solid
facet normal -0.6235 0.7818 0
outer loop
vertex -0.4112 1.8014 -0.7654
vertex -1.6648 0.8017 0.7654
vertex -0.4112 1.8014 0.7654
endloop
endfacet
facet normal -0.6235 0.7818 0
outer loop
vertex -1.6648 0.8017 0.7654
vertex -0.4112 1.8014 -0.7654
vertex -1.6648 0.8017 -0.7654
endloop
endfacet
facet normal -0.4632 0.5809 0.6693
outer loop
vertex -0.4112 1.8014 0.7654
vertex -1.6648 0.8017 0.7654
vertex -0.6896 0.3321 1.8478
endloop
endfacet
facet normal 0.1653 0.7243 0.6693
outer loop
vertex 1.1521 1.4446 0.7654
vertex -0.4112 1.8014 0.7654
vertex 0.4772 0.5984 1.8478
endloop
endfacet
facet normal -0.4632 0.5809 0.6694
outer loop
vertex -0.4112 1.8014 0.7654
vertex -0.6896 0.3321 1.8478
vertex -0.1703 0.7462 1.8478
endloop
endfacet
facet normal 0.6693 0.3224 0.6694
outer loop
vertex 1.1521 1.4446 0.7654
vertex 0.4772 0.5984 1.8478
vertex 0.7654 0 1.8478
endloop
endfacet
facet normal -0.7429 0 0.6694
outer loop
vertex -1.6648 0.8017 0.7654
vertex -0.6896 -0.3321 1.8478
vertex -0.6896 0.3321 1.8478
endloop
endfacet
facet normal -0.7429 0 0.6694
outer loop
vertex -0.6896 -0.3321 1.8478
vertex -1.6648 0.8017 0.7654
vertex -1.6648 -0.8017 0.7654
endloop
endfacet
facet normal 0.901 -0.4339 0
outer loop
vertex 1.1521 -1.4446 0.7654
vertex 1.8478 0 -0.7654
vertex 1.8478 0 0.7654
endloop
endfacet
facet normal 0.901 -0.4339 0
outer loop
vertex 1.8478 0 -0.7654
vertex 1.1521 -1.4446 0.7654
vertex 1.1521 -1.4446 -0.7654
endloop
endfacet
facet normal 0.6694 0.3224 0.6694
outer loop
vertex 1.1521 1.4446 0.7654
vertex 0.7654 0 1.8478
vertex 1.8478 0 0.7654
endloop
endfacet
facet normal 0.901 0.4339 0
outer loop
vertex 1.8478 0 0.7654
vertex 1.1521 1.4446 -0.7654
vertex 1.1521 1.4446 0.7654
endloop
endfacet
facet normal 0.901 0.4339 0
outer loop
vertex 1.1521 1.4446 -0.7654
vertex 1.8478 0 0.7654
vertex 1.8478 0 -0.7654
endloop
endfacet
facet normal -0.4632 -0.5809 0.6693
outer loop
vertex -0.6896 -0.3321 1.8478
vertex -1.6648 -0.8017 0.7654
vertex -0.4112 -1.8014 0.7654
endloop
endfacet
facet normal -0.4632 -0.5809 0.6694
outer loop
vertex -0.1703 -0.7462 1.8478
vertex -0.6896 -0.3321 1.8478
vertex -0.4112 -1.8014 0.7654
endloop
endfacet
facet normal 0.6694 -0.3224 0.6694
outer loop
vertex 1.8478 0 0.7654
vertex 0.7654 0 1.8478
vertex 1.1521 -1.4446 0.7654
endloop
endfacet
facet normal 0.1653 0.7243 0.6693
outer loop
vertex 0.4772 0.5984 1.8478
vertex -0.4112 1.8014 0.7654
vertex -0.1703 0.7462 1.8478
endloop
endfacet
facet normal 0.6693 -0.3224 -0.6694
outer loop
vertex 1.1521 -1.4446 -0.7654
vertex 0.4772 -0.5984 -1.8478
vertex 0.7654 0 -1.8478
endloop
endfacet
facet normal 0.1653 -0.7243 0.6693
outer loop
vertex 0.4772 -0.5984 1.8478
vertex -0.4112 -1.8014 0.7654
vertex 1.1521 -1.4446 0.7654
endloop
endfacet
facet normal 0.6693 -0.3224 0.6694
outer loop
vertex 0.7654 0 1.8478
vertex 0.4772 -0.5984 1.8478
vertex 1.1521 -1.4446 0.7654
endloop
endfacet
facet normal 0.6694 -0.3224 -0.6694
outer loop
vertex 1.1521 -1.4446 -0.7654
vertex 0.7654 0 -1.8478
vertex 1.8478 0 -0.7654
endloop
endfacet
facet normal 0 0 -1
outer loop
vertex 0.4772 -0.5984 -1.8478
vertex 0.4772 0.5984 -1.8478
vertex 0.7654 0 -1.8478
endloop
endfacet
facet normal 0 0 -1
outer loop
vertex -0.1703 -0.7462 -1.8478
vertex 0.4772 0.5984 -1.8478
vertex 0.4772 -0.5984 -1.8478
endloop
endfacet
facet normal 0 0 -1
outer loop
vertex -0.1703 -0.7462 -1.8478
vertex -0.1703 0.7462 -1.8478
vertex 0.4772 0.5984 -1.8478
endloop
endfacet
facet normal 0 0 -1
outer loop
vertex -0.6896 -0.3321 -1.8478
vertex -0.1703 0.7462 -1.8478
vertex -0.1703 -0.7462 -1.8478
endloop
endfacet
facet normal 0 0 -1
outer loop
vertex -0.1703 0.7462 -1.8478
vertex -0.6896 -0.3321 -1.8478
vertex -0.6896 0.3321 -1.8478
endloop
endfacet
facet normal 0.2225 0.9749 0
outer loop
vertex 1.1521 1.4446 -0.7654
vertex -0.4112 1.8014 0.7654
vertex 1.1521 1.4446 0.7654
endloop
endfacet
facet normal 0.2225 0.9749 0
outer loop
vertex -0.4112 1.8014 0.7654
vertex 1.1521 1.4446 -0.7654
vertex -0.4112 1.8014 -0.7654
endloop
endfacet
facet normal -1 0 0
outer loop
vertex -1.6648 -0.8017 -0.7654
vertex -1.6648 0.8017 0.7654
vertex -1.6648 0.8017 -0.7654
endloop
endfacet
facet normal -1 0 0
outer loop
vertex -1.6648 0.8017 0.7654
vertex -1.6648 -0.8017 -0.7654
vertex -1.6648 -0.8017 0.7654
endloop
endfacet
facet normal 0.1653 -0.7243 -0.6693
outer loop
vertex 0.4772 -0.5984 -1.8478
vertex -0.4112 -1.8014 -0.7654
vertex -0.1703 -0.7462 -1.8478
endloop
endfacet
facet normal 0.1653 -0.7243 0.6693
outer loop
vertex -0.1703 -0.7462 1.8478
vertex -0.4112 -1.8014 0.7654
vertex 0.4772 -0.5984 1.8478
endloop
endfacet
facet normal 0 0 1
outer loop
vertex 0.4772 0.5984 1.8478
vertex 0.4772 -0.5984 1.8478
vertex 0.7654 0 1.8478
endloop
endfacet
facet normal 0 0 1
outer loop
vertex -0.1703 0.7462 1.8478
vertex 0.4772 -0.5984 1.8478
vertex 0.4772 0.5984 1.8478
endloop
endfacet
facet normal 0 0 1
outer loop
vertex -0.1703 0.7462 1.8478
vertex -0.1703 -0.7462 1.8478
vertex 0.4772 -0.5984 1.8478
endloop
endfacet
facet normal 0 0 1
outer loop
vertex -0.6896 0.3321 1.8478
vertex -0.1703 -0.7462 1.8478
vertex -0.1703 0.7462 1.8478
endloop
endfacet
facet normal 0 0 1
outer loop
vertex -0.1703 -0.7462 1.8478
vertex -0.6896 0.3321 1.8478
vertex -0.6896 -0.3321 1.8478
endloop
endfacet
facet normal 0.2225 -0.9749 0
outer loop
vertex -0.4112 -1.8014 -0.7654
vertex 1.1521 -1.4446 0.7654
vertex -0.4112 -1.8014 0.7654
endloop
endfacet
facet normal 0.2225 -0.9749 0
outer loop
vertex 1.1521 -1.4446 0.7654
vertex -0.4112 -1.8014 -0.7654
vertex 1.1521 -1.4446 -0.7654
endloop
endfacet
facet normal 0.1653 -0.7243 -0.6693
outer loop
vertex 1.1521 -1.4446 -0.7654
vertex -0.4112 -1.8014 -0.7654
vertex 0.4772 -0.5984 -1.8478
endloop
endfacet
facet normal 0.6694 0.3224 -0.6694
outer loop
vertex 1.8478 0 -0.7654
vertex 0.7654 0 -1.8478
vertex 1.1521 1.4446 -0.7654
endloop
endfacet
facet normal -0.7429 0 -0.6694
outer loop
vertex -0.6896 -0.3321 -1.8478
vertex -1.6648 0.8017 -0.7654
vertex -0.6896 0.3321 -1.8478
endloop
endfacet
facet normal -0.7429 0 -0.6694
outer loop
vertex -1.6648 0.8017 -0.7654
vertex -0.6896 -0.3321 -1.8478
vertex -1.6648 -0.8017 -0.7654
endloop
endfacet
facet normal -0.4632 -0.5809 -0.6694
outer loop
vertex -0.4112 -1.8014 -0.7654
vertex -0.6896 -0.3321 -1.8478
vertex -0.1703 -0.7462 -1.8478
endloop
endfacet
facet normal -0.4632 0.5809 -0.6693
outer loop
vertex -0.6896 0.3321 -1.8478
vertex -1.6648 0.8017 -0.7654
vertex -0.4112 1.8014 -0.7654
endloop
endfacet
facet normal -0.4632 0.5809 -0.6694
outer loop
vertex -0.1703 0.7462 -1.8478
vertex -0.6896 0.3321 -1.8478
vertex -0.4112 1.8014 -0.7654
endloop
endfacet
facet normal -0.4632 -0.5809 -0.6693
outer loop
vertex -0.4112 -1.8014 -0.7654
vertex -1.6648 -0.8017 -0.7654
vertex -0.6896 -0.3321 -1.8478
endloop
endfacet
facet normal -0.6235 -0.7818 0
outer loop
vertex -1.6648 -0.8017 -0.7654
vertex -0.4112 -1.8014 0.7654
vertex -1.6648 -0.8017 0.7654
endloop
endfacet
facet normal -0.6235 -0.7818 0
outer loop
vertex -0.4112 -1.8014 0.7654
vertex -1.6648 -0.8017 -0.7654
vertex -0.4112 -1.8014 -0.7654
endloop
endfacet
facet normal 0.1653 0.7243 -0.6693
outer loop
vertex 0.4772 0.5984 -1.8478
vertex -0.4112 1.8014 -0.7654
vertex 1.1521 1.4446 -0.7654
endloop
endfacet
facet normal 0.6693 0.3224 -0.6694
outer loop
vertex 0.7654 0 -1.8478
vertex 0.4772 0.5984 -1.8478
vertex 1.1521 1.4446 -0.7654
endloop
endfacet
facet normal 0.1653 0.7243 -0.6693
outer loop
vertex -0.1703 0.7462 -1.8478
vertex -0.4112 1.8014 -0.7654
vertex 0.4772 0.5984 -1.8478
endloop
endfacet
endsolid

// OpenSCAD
// Generated by generate_scads.py
intersection() {
  cube(size=[30,20,30], center=true);
  scale([1.0,1.5,1.5]) {
    cylinder(h=10, r=12, center=true);
  }
  cylinder(h=30, r=12, center=true);
  sphere(r=2);
}
